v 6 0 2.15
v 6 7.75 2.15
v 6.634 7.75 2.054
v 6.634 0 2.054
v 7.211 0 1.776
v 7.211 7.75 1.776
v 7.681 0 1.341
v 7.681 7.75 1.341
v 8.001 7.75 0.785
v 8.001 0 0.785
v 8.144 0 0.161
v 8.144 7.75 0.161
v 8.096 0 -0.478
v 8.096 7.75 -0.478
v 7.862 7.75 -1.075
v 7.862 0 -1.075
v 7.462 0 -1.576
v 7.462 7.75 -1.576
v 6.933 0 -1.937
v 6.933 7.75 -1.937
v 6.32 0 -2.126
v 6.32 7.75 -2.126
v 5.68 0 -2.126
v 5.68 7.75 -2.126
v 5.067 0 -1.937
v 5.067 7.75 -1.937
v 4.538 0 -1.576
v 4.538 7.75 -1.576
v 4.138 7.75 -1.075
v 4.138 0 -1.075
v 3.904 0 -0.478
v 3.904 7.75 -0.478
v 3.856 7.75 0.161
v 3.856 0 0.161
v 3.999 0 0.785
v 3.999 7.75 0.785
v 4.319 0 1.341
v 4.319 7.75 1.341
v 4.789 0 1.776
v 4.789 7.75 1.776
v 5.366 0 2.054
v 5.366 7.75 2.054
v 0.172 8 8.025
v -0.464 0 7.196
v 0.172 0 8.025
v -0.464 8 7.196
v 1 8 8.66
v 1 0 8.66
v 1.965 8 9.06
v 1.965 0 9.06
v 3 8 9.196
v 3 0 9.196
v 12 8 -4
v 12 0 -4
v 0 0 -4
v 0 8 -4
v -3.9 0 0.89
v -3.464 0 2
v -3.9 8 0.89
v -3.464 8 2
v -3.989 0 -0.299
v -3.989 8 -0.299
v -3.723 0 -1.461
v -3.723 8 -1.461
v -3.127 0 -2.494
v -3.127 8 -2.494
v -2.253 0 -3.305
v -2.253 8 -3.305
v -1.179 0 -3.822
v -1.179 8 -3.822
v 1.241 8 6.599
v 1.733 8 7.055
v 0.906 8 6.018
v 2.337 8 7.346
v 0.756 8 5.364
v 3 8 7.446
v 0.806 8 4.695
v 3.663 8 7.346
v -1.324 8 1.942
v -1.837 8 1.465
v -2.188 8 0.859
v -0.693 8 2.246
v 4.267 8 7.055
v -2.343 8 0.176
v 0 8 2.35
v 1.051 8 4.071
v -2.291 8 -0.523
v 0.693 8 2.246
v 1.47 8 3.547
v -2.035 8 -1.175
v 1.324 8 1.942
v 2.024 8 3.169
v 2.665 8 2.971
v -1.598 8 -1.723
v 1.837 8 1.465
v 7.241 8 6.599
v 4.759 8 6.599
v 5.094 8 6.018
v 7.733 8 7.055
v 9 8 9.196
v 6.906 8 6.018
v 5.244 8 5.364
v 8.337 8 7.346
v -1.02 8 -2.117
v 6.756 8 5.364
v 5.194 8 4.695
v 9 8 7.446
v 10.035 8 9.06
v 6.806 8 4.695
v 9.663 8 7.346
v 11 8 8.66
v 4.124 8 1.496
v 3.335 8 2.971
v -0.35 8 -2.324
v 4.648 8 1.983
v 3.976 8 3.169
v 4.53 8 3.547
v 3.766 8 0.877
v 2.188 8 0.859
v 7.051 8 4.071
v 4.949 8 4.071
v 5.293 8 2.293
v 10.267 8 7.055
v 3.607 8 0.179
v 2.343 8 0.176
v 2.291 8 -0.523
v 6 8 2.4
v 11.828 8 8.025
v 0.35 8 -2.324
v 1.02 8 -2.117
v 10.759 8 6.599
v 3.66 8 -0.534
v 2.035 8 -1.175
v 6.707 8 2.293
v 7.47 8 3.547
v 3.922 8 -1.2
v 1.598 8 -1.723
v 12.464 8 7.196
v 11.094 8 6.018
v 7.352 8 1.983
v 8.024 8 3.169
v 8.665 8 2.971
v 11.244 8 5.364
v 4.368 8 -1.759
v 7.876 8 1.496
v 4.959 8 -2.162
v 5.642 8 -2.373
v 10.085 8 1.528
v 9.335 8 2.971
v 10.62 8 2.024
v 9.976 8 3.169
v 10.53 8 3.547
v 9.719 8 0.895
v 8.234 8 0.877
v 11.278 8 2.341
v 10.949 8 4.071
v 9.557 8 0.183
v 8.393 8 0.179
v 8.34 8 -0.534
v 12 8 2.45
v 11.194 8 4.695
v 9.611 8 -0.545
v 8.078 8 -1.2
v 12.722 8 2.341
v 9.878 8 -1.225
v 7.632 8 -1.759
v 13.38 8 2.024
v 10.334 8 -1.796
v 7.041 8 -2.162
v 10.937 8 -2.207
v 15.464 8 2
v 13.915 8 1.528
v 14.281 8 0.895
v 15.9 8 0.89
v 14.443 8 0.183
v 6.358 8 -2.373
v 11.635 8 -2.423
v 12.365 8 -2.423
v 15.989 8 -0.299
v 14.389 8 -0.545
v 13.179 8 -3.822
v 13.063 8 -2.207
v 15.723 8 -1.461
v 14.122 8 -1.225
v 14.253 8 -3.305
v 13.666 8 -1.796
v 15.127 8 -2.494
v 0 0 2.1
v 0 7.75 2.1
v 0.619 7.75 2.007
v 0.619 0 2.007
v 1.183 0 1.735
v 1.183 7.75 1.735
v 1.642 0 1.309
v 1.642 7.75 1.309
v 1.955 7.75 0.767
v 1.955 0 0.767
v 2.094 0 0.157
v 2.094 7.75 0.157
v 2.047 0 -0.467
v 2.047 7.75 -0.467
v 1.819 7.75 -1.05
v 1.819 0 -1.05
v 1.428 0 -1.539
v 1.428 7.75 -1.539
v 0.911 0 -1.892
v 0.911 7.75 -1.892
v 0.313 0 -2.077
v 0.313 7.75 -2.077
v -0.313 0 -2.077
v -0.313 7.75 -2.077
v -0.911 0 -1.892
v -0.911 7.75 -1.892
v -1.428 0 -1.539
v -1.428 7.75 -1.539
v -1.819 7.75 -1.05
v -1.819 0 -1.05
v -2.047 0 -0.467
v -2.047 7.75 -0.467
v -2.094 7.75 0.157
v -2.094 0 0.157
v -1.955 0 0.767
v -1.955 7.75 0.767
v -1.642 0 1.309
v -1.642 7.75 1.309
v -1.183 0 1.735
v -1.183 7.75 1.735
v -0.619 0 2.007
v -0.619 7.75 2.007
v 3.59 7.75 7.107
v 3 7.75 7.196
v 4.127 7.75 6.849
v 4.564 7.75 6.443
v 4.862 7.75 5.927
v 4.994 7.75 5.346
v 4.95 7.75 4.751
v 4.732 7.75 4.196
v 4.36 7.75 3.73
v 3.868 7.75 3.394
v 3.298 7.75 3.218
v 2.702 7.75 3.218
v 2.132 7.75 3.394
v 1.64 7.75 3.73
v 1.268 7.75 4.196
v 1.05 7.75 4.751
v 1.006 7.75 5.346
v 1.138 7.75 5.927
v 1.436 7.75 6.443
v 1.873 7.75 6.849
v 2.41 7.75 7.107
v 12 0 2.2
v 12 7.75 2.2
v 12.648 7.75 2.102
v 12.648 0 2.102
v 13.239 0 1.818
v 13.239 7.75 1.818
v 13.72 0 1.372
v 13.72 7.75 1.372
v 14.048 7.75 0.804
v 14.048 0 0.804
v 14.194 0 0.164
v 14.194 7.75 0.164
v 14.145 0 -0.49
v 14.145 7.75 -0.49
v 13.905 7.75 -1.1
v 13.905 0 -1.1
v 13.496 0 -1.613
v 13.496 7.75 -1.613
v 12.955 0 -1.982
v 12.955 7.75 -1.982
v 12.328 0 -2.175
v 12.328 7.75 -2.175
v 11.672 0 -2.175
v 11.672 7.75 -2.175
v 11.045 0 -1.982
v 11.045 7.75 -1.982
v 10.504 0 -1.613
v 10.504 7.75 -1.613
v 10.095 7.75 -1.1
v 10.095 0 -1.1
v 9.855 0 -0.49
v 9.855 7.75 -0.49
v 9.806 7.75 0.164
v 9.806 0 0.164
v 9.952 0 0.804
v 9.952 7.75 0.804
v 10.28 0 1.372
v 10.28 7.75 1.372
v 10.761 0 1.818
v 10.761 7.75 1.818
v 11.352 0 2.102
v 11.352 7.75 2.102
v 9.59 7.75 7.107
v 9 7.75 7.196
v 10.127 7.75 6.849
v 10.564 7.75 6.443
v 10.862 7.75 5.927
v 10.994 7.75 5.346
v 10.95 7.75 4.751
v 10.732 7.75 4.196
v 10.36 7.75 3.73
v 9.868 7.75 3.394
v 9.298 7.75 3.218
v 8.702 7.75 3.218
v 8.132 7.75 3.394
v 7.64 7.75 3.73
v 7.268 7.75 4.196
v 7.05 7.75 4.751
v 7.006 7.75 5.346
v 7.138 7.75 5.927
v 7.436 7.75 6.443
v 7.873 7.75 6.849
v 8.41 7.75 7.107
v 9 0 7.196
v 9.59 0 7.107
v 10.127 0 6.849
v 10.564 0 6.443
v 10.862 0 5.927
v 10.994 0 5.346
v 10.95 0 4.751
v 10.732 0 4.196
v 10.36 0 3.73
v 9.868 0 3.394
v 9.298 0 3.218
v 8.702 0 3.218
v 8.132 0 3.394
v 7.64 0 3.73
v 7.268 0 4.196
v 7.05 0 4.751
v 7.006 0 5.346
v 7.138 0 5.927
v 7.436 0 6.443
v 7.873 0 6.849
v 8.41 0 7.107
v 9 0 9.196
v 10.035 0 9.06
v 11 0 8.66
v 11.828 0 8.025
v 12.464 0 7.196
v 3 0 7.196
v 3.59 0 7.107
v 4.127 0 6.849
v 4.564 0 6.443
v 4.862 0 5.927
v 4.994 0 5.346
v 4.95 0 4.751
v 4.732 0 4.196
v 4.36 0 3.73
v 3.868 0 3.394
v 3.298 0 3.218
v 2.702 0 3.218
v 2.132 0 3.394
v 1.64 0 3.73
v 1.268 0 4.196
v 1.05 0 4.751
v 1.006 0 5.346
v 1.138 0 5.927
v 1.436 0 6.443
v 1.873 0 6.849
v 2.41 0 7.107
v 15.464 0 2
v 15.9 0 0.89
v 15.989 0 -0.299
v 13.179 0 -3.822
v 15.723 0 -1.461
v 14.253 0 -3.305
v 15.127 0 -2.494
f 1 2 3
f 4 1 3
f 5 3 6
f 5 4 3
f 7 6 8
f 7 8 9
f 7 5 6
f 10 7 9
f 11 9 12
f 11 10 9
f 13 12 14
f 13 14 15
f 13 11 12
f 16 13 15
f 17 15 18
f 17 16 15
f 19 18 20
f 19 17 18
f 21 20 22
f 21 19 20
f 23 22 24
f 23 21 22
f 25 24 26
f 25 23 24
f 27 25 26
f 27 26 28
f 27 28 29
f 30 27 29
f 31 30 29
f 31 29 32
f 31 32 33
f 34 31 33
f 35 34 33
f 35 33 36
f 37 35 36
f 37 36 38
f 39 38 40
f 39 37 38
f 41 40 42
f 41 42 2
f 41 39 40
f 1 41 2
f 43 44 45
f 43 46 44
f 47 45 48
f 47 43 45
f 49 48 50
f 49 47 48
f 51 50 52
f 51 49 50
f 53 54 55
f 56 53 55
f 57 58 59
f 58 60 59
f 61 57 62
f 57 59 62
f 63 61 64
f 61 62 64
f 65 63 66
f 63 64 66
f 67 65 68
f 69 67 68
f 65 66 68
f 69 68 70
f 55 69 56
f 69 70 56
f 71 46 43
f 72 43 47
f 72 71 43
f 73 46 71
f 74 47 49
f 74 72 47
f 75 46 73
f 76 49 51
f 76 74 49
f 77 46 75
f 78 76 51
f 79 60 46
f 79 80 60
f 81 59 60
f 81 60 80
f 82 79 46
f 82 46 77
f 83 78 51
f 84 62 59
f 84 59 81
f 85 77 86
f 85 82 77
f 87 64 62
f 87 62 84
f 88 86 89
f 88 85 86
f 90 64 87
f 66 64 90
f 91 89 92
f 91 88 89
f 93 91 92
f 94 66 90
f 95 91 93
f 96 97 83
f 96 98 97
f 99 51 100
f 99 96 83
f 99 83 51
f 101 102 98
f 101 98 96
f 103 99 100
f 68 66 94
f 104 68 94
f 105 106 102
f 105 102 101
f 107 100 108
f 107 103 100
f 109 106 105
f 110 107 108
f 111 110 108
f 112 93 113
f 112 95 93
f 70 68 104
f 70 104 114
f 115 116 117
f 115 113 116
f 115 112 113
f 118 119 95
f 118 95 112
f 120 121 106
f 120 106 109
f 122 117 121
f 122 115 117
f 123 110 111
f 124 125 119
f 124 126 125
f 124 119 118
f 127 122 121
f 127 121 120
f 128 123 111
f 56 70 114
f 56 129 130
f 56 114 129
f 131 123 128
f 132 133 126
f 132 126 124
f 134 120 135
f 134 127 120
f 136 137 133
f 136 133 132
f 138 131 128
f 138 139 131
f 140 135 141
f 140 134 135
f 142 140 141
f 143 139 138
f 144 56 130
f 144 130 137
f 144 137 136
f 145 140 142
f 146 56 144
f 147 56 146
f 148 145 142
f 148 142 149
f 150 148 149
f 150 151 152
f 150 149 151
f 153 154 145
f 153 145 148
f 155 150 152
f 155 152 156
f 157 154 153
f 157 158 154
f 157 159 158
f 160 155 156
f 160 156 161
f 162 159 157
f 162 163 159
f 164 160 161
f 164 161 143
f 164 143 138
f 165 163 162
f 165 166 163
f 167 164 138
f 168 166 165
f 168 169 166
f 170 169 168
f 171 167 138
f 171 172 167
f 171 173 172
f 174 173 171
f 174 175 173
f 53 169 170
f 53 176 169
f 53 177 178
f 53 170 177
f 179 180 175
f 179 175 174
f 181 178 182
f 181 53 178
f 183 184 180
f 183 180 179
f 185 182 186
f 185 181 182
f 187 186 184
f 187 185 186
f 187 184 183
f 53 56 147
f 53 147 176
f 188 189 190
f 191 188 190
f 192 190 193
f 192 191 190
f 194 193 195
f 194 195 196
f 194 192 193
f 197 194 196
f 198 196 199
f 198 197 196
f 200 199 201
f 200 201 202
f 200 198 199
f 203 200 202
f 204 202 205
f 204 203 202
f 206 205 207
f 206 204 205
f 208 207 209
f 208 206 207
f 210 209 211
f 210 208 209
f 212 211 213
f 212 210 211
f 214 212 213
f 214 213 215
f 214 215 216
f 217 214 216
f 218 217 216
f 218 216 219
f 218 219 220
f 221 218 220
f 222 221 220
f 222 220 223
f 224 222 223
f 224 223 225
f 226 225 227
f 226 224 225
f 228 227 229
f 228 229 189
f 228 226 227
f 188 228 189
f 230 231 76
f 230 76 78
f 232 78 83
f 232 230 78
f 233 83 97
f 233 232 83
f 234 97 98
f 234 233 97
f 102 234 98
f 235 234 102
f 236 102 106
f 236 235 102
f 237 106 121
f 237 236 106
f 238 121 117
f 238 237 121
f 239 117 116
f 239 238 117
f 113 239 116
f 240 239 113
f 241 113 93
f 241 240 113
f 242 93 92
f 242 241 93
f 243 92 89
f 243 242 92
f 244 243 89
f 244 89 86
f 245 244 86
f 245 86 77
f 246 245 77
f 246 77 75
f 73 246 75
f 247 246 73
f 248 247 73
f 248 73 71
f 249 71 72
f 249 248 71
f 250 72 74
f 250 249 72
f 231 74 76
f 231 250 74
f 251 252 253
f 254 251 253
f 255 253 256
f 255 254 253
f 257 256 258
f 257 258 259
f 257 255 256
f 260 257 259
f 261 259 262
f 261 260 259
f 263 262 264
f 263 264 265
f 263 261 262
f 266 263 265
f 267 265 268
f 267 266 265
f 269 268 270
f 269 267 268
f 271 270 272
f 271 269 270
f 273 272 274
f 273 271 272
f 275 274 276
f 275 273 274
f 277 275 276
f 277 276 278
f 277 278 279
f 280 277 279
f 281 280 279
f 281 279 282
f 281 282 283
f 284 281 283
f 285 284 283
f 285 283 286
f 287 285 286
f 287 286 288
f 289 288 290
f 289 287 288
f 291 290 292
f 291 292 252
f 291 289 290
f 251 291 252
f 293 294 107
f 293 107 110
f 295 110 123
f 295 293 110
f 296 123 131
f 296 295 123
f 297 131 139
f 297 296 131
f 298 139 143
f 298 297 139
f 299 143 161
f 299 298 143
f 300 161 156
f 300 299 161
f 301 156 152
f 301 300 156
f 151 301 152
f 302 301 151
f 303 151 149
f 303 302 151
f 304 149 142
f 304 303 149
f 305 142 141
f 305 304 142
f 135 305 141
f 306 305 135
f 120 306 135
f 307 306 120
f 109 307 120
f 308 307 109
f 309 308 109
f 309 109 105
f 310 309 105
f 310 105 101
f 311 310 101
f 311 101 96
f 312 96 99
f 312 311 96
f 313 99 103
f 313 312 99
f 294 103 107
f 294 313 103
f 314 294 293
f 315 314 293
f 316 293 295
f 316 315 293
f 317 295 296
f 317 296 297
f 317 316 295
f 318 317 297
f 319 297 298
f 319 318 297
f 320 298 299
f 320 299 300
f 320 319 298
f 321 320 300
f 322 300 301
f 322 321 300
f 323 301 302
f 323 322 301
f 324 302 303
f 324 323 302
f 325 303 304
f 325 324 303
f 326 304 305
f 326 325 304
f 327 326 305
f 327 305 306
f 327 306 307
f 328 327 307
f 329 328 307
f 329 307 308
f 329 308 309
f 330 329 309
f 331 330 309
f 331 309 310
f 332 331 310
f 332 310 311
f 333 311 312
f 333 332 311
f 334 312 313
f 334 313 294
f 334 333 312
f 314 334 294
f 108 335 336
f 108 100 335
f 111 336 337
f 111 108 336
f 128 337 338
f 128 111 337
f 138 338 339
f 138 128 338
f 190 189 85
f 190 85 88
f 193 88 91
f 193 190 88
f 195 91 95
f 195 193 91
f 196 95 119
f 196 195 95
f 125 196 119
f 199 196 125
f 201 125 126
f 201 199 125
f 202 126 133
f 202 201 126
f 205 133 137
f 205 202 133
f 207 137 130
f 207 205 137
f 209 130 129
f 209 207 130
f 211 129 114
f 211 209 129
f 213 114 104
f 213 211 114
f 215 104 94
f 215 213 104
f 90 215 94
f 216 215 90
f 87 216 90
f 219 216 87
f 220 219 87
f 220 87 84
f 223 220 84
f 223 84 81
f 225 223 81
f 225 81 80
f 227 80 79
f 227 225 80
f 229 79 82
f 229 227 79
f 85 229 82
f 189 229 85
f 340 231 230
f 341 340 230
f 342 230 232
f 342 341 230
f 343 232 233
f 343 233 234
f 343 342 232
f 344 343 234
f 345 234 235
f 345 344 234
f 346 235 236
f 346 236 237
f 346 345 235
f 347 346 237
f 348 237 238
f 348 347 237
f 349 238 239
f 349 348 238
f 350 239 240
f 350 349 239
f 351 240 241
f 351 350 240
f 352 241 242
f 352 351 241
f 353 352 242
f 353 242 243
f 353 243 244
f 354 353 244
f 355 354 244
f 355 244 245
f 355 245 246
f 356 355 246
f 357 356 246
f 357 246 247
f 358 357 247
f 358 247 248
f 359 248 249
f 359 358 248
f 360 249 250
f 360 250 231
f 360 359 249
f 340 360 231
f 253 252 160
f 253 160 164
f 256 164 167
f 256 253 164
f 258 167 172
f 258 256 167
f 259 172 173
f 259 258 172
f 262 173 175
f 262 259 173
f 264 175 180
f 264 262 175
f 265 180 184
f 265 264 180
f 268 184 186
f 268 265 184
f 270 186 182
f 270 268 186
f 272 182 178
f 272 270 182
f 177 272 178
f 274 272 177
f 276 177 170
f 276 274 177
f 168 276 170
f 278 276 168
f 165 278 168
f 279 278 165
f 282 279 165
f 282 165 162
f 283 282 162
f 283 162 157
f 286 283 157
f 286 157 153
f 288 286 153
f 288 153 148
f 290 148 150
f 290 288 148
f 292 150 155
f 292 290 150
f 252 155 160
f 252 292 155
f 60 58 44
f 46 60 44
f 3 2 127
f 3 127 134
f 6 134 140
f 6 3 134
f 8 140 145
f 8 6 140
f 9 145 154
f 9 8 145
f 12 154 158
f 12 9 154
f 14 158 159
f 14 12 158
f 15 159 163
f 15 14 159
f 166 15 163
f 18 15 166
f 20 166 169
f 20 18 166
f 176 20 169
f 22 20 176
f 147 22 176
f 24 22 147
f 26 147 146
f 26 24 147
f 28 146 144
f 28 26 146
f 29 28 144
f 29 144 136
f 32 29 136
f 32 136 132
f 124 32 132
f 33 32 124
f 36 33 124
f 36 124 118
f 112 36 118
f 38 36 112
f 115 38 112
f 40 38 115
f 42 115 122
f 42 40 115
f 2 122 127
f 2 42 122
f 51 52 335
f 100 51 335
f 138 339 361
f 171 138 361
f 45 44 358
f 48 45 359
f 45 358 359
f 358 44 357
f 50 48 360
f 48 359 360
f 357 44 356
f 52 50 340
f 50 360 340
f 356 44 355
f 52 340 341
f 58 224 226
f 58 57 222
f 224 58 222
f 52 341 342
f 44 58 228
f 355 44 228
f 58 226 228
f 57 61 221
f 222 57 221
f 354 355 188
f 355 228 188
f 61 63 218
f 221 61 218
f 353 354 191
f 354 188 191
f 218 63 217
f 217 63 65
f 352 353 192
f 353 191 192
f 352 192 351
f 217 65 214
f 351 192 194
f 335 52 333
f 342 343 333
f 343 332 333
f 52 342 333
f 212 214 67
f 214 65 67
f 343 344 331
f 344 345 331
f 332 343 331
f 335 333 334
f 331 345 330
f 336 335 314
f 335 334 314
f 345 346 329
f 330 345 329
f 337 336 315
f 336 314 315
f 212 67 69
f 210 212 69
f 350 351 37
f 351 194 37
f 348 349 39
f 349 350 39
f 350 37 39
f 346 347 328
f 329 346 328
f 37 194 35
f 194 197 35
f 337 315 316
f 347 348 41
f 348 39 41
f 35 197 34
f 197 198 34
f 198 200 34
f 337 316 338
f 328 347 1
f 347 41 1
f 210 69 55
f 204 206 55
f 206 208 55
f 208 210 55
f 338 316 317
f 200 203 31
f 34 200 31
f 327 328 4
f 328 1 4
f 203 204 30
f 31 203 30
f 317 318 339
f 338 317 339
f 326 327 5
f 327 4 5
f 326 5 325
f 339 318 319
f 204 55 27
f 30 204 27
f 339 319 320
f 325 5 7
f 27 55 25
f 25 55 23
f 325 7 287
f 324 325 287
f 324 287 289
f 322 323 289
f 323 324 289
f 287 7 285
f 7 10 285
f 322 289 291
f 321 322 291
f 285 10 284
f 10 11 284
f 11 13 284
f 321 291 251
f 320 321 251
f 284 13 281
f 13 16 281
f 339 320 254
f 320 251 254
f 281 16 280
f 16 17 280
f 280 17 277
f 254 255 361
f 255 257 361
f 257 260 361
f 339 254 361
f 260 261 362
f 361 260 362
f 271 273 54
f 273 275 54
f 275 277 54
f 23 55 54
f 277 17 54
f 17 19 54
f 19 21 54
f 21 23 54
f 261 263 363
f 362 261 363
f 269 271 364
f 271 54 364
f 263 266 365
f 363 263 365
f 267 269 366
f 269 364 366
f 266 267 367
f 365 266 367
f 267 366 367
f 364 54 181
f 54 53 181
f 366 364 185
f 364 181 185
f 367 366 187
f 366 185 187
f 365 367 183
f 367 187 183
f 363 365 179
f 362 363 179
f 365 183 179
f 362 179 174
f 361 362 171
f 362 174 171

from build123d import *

# Parameters (mm, degrees)
SKETCH1_R           = 2.1
SKETCH1_R_2         = 2.15
SKETCH1_R_3         = 2.2
SKETCH1_R_4         = 2
BOSS_EXTRUDE1_DEPTH = 8
FILLET1_R           = 4
CHAMFER1_SIZE       = 0.25


with BuildPart() as part:
    # Sketch1 → Boss-Extrude1 (new body)
    with BuildSketch(Plane(origin=(0, 0, 0), x_dir=(1, 0, 0), z_dir=(0, 1, 0))):
        Polygon((-6.92820323, 4), (0.690598923, -9.196152423), (11.309401077, -9.196152423), (18.92820323, 4), align=None)
        with Locations(Location((0, 0, 0), (0, 0, 270))):
            Circle(SKETCH1_R, mode=Mode.SUBTRACT)
        with Locations(Location((6, 0, 0), (0, 0, 270))):
            Circle(SKETCH1_R_2, mode=Mode.SUBTRACT)
        with Locations(Location((12, 0, 0), (0, 0, 270))):
            Circle(SKETCH1_R_3, mode=Mode.SUBTRACT)
        with Locations(Location((3, -5.196152423, 0), (0, 0, 270))):
            Circle(SKETCH1_R_4, mode=Mode.SUBTRACT)
        with Locations(Location((9, -5.196152423, 0), (0, 0, 270))):
            Circle(SKETCH1_R_4, mode=Mode.SUBTRACT)
    extrude(amount=BOSS_EXTRUDE1_DEPTH)

    # Fillet1
    fillet1_edges = [part.edges().sort_by_distance(p)[0] for p in [
        (18.92820323, 4, -4),
        (11.309401077, 4, 9.196152423),
        (0.690598923, 4, 9.196152423),
        (-6.92820323, 4, -4),
    ]]
    fillet(fillet1_edges, radius=FILLET1_R)

    # Chamfer1
    chamfer1_edges = [part.edges().sort_by_distance(p)[0] for p in [
        (0, 8, -2.1),
        (6, 8, -2.15),
        (12, 8, -2.2),
        (9, 8, 3.196152423),
        (3, 8, 3.196152423),
    ]]
    chamfer(chamfer1_edges, length=CHAMFER1_SIZE)


solid = part.part
